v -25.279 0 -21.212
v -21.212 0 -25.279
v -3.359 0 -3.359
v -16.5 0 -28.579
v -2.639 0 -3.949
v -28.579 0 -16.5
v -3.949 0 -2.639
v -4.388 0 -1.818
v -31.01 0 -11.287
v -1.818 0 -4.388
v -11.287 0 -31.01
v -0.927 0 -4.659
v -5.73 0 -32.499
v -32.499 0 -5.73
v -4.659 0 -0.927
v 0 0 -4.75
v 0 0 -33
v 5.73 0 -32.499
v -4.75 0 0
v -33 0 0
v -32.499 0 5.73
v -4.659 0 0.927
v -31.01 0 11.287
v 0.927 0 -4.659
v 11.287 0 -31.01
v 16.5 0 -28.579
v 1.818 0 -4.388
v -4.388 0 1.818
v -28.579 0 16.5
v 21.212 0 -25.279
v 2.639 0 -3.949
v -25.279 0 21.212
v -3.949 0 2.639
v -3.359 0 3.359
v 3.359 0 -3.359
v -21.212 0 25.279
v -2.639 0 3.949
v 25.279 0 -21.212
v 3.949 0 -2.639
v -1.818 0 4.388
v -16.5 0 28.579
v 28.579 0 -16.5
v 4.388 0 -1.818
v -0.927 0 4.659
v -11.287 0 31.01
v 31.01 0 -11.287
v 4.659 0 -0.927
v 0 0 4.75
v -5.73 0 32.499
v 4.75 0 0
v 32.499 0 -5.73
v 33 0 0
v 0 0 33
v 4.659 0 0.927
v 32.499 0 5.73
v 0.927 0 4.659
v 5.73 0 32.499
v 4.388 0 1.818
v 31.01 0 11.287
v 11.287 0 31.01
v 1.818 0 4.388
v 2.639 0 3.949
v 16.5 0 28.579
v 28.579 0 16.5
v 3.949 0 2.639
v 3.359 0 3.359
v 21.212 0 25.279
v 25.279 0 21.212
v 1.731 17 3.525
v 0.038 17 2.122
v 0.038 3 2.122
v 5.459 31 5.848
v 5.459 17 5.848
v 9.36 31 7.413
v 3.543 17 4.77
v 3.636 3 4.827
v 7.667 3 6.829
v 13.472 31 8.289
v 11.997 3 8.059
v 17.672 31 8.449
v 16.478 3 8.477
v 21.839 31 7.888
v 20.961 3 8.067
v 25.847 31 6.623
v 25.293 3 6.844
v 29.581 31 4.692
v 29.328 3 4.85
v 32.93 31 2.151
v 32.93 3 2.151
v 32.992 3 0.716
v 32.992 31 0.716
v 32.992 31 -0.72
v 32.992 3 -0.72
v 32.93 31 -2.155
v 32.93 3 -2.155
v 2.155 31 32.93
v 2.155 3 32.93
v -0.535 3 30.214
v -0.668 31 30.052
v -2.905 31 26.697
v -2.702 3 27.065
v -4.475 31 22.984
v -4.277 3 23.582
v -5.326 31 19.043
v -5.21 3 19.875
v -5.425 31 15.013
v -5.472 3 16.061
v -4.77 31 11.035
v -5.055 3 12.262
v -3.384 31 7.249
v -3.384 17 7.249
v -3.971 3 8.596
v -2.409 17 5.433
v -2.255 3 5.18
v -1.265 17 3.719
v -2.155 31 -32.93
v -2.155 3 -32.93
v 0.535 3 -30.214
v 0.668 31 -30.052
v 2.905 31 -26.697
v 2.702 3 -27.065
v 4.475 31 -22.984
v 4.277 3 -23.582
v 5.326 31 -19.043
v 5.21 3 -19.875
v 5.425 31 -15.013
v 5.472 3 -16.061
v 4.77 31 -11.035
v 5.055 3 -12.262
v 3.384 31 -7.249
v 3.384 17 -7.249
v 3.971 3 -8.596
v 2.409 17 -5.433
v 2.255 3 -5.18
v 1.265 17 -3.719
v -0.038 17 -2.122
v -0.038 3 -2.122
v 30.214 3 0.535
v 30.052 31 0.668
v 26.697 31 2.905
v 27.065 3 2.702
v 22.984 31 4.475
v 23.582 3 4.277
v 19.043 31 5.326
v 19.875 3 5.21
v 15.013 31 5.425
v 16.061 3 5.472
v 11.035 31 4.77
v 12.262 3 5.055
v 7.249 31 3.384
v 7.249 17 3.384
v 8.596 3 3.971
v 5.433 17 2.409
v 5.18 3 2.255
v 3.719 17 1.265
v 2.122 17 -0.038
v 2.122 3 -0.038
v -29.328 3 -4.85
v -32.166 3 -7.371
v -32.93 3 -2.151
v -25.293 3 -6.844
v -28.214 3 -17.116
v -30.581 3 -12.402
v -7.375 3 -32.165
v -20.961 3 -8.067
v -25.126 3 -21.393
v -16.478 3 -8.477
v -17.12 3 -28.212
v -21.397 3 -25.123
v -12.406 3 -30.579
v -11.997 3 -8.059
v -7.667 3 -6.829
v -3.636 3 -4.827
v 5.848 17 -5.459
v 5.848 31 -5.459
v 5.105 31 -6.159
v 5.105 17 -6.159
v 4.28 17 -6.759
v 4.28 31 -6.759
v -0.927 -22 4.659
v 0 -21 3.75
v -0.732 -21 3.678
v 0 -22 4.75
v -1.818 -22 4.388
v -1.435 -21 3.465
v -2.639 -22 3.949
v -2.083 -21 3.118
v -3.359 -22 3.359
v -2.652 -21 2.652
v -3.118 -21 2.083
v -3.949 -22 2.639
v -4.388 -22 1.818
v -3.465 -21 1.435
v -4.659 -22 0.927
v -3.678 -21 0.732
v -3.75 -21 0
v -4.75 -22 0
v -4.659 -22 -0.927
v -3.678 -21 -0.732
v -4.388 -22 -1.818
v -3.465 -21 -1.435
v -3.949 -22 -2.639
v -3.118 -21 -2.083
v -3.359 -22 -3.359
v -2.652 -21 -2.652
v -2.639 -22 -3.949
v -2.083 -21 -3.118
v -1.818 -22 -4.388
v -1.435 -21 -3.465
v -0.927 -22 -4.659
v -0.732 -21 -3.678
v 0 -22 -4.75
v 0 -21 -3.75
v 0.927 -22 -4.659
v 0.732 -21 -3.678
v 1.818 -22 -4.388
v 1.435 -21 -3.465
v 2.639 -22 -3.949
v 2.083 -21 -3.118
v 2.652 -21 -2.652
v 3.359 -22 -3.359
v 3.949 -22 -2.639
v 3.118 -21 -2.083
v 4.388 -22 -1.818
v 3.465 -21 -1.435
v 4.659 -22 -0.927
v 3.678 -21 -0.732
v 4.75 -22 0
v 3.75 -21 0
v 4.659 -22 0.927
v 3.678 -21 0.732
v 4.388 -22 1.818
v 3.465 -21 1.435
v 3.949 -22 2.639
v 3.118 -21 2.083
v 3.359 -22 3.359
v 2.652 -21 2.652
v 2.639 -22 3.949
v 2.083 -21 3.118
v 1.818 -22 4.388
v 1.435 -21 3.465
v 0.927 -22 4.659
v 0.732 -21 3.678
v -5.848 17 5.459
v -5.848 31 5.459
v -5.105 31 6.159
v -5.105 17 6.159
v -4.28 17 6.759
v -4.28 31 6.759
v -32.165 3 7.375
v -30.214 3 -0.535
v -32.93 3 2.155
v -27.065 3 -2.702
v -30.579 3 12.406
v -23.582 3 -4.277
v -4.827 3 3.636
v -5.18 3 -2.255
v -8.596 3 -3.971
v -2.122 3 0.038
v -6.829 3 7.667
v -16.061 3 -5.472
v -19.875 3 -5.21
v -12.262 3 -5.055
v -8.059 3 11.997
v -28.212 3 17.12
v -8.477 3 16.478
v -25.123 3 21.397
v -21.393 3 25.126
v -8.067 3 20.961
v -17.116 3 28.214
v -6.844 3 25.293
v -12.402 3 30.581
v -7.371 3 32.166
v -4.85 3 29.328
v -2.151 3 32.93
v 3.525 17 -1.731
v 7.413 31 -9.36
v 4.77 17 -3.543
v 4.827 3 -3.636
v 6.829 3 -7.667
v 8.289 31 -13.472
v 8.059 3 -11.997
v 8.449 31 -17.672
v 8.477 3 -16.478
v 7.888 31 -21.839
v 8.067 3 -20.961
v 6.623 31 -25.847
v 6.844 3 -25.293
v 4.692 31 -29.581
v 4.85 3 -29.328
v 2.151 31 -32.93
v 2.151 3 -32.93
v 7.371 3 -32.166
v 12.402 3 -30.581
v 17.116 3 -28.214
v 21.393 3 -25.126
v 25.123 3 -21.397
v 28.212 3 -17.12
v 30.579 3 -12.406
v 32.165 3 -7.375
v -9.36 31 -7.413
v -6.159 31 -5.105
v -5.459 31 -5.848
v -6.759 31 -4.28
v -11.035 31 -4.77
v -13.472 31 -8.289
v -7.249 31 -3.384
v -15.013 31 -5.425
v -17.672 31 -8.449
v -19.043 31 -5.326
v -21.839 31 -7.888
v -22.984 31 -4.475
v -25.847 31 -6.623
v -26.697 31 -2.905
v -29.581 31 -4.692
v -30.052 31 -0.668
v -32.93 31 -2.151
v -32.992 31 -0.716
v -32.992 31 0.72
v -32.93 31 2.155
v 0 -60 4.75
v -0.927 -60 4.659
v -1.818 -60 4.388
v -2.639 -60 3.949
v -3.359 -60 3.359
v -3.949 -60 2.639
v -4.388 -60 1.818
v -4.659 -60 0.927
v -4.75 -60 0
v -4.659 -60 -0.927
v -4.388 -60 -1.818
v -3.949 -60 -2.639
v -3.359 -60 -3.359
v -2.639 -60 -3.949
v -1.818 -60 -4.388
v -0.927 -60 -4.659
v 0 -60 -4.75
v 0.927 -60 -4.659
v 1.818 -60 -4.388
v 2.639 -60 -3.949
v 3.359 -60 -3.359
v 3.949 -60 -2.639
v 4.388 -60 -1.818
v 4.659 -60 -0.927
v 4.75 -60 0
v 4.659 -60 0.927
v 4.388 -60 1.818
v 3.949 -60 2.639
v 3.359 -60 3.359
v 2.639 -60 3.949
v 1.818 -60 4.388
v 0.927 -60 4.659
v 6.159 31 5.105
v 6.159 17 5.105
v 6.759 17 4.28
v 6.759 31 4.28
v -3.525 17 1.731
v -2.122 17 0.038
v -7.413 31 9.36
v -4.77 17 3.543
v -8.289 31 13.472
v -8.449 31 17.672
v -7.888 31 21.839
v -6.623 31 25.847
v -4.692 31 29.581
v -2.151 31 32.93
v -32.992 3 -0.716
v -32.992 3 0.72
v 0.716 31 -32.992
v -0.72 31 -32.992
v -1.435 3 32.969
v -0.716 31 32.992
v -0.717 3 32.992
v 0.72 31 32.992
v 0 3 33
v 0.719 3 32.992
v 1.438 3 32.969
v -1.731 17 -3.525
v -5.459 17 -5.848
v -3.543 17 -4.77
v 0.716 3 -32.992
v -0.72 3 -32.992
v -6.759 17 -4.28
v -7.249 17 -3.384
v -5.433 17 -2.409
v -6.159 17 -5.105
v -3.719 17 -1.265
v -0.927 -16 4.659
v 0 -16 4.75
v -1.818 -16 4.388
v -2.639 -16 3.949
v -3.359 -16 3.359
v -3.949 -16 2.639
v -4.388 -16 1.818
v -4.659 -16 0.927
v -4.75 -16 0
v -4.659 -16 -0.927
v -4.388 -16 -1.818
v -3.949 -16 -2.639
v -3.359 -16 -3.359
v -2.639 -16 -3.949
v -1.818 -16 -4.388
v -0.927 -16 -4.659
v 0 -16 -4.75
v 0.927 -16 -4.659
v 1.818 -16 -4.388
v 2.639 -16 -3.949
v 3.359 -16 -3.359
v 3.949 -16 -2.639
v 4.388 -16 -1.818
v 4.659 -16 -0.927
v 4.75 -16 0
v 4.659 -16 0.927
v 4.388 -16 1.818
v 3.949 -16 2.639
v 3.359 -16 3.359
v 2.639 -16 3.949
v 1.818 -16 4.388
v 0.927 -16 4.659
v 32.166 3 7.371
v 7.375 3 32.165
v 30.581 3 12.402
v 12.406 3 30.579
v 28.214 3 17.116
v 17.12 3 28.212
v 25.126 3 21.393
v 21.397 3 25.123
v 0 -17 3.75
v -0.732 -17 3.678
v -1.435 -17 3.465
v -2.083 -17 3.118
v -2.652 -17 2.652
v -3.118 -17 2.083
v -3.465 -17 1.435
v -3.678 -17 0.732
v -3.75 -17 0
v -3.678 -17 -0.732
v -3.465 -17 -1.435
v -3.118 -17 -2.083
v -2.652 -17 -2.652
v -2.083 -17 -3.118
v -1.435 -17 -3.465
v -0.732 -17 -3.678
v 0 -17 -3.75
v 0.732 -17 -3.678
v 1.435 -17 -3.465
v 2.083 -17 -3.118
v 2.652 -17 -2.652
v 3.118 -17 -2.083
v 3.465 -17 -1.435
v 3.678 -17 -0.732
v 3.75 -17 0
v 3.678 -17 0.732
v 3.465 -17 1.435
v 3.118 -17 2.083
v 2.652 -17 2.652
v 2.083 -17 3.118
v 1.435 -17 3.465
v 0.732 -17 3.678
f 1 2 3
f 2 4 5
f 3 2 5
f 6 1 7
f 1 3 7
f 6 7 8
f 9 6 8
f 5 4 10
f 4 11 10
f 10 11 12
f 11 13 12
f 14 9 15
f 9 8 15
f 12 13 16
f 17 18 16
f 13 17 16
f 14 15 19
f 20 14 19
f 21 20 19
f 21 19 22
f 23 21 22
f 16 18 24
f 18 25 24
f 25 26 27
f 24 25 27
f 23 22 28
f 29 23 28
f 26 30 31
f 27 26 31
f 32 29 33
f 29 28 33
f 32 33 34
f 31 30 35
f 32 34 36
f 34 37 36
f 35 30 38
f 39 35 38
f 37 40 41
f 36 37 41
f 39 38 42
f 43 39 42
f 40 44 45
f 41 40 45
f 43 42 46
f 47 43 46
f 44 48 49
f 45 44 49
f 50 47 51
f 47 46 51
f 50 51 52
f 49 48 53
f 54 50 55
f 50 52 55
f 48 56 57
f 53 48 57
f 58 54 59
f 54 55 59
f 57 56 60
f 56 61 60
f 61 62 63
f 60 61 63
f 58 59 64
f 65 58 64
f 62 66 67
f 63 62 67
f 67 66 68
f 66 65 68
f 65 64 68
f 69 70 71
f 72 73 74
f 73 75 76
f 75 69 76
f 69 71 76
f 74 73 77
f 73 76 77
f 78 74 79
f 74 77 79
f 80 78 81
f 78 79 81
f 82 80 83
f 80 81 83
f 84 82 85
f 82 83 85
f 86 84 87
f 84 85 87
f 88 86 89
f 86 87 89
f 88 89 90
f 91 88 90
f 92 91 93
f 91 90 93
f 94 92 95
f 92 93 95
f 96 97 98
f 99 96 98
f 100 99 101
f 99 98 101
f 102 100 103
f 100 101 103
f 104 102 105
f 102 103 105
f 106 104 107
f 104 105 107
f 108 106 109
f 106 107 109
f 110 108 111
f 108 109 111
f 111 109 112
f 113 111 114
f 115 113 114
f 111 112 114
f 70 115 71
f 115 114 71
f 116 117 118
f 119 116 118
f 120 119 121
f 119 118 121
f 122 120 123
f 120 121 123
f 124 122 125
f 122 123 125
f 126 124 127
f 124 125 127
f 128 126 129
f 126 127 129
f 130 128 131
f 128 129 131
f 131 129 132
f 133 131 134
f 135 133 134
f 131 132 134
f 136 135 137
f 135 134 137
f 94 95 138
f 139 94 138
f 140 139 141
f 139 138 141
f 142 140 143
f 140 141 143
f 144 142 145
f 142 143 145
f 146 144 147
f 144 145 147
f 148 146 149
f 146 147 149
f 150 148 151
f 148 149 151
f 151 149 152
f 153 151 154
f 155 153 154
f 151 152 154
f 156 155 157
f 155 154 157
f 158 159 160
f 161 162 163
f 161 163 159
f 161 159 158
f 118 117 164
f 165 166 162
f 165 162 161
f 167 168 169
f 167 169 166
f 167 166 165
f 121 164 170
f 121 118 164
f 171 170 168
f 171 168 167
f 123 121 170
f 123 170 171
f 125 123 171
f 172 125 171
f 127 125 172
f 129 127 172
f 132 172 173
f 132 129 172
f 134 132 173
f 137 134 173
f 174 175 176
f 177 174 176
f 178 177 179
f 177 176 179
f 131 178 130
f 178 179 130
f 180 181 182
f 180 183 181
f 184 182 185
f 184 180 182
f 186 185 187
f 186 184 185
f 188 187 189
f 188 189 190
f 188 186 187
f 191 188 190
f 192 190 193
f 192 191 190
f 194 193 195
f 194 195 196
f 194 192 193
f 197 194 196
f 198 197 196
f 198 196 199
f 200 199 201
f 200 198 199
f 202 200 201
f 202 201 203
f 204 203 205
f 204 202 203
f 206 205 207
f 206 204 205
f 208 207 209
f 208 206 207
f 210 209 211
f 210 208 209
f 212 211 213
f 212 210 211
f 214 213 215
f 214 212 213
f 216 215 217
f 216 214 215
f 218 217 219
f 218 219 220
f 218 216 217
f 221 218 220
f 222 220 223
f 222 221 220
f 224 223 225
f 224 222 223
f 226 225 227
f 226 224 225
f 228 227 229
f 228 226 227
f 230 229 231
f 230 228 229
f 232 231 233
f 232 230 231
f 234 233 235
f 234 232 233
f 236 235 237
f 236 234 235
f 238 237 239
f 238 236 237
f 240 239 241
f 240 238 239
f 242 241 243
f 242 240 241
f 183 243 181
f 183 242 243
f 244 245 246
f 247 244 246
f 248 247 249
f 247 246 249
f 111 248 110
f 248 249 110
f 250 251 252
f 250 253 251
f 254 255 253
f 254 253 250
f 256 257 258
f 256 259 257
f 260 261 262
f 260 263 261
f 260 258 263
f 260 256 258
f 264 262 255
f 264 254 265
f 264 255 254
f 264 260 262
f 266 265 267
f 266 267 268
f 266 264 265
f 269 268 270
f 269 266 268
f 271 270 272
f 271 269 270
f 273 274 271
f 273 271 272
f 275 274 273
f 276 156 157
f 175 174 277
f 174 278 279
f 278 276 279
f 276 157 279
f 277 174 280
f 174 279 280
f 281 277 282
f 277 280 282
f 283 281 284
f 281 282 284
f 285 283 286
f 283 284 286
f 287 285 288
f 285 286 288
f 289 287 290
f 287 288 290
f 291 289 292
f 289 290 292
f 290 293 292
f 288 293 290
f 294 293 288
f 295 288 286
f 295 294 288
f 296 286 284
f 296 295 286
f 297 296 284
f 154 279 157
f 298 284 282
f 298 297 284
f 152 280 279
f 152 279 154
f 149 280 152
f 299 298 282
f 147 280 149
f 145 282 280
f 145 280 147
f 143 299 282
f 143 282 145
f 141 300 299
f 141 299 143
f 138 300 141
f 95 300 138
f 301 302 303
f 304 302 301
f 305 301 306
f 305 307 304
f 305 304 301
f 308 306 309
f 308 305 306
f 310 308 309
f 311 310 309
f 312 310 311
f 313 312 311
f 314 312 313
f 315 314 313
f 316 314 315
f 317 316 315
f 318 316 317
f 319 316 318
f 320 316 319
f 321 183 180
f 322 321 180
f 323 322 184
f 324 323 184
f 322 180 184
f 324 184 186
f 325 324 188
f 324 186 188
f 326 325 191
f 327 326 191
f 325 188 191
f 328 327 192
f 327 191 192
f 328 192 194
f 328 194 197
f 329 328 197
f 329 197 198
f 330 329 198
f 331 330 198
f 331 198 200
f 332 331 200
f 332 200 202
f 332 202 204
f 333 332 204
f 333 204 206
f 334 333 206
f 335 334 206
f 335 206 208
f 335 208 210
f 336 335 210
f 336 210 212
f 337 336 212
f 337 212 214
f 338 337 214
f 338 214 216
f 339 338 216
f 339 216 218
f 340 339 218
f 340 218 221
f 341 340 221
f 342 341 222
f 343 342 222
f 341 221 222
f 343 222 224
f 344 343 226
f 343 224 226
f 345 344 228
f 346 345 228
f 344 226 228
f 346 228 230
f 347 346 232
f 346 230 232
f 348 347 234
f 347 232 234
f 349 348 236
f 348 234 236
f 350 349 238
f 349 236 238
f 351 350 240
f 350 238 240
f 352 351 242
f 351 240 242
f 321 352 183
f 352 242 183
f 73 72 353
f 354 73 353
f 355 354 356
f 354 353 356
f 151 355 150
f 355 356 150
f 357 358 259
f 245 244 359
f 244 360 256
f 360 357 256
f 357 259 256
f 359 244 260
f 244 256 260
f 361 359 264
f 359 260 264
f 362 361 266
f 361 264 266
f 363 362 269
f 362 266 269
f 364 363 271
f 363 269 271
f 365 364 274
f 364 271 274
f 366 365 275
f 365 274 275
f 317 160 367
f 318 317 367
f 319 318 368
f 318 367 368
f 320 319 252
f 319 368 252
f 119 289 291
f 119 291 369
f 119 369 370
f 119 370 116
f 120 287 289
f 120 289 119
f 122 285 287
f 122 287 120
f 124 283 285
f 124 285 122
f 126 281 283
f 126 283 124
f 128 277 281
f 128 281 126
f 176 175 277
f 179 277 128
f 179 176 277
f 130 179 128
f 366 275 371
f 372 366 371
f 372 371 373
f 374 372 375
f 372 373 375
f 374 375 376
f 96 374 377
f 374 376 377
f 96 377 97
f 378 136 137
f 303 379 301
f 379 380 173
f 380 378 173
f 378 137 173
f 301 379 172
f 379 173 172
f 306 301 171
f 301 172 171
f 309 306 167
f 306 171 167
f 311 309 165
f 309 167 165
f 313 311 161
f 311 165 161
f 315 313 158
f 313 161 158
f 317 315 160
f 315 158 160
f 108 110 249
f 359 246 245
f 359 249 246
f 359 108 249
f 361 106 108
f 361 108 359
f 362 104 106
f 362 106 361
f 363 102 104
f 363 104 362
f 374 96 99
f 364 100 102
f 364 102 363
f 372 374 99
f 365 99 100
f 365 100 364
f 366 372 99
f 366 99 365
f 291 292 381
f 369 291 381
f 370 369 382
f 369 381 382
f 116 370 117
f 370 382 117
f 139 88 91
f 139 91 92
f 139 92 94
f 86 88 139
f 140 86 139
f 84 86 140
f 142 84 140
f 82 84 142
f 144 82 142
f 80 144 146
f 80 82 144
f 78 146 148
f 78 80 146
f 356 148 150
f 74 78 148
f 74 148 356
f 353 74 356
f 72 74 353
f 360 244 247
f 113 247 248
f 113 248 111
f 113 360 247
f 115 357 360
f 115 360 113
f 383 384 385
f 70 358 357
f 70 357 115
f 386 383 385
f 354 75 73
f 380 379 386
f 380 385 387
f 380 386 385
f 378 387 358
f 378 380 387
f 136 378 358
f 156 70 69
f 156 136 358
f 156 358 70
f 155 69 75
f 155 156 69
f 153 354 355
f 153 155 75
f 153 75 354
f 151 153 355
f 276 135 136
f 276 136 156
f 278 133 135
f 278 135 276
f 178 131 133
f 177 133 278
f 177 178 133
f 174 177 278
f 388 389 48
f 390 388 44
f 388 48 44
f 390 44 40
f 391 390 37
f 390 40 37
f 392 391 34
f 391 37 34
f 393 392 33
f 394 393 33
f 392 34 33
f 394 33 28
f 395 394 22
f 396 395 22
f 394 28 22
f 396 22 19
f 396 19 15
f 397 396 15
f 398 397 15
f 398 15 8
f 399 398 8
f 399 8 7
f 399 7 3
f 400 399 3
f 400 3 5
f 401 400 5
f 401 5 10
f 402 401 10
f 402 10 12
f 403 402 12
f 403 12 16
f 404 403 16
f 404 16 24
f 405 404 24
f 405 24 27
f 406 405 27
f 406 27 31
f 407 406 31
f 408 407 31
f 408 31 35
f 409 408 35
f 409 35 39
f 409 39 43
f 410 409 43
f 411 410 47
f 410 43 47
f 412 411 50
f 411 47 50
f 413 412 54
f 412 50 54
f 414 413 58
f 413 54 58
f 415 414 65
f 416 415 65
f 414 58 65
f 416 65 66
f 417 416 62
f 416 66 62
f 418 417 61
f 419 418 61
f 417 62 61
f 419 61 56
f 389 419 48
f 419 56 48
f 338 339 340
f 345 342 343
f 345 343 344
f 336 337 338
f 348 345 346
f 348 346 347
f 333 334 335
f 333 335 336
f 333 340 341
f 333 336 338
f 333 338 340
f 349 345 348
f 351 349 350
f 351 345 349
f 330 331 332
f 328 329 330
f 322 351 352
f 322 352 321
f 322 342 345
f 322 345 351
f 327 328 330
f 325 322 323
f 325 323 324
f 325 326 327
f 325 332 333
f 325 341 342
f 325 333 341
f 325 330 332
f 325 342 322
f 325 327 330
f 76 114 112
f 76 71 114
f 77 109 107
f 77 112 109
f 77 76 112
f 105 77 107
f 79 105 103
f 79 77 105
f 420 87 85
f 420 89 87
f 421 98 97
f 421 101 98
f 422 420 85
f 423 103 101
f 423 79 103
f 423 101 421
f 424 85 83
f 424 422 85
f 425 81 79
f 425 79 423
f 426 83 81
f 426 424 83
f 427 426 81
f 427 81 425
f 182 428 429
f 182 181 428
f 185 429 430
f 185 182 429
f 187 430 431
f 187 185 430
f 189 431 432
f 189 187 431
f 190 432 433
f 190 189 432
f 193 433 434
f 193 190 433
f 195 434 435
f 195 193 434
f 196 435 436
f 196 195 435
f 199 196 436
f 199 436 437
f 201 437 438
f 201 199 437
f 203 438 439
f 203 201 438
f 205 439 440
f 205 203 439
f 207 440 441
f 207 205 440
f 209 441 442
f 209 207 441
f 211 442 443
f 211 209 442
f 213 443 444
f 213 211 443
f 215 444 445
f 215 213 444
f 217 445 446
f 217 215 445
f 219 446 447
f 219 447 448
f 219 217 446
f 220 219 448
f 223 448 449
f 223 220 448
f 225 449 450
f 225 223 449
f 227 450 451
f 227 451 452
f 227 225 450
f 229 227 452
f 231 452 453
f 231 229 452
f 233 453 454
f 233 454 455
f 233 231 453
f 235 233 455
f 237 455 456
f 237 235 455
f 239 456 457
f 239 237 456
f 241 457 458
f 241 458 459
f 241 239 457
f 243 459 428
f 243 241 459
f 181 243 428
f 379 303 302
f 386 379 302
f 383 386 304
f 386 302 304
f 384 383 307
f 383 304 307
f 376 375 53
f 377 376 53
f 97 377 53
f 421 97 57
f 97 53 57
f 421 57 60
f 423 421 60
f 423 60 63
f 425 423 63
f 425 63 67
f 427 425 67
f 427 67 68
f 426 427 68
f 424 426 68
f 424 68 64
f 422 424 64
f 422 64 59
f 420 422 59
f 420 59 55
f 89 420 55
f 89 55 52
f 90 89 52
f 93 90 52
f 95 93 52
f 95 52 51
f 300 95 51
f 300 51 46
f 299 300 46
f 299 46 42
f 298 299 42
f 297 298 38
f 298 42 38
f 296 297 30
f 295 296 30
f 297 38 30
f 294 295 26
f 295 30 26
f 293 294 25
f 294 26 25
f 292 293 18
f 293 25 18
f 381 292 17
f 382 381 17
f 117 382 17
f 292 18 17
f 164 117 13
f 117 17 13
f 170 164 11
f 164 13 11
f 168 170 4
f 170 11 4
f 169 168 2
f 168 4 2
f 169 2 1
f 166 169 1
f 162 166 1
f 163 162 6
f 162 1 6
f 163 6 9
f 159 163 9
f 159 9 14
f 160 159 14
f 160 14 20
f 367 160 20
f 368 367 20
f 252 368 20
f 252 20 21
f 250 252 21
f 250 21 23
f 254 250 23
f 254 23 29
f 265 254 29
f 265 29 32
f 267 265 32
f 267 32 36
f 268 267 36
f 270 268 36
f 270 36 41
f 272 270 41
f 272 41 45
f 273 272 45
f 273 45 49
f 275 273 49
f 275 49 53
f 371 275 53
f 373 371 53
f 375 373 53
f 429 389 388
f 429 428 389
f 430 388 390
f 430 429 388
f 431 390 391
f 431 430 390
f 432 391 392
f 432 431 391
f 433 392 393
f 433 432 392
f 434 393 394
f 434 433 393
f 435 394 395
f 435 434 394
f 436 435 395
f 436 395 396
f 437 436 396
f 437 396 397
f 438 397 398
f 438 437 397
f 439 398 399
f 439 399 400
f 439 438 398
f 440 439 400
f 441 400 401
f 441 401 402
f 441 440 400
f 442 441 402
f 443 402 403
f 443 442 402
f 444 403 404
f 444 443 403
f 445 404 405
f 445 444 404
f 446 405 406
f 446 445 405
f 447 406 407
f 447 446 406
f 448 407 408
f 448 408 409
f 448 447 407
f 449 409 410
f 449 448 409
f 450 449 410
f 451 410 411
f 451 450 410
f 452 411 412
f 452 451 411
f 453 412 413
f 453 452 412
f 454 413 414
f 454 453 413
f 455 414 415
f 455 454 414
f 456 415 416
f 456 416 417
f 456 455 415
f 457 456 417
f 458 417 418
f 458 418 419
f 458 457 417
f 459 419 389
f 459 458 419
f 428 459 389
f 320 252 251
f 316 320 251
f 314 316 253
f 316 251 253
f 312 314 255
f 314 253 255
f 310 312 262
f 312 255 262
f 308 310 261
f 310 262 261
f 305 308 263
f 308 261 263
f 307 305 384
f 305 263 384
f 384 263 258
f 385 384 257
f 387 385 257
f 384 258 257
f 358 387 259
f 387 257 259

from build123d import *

# Parameters (mm, degrees)
SKETCH1_R           = 33
BOSS_EXTRUDE1_DEPTH = 3
BOSS_EXTRUDE3_DEPTH = 28
CIRPATTERN2_COUNT   = 4
SKETCH4_R           = 8
CUT_EXTRUDE1_DEPTH  = 14
SKETCH5_R           = 4.75
BOSS_EXTRUDE4_DEPTH = 60


with BuildPart() as part:
    # Sketch1 → Boss-Extrude1 (new body)
    with BuildSketch(Plane(origin=(0, 0, 0), x_dir=(1, 0, 0), z_dir=(0, 1, 0))):
        with Locations(Location((0, 0, 0), (0, 0, 270))):
            Circle(SKETCH1_R)
    extrude(amount=BOSS_EXTRUDE1_DEPTH)

    # Sketch3 → Boss-Extrude3 (add)
    with BuildSketch(Plane(origin=(0, 3, 0), x_dir=(1, 0, 0), z_dir=(0, 1, 0))):
        with BuildLine():
            Line((1.076086957, 1.045005676), (-1.076086957, -1.045005676))
            ThreePointArc((-1.076086957, -1.045005676), (15.703563953, -8.46363111), (32.929819694, -2.151040426))
            ThreePointArc((32.929819694, -2.151040426), (32.999999926, 0.002211213), (32.929531131, 2.155453428))
            ThreePointArc((32.929531131, 2.155453428), (17.249059735, -5.463527063), (1.076086957, 1.045005676))
        make_face()
    boss_extrude3 = extrude(amount=BOSS_EXTRUDE3_DEPTH)

    # CirPattern2: Boss-Extrude3 ×4 about axis
    cirpattern2_axis = Axis((0, 0, 0), (0, 1, 0))
    for i in range(1, CIRPATTERN2_COUNT):
        add(boss_extrude3.rotate(cirpattern2_axis, i * 360 / CIRPATTERN2_COUNT))

    # Sketch4 → Cut-Extrude1 (cut)
    with BuildSketch(Plane(origin=(0, 31, 0), x_dir=(1, 0, 0), z_dir=(0, 1, 0))):
        Circle(SKETCH4_R)
    extrude(amount=-CUT_EXTRUDE1_DEPTH, mode=Mode.SUBTRACT)

    # Sketch5 → Boss-Extrude4 (add)
    with BuildSketch(Plane.XZ):
        with Locations(Location((0, 0, 0), (0, 0, 90))):
            Circle(SKETCH5_R)
    extrude(amount=BOSS_EXTRUDE4_DEPTH)

    # Sketch6 → Cut-Revolve1 (revolve, cut)
    with BuildSketch(Plane.XY, mode=Mode.PRIVATE) as cut_revolve1_sk:
        Polygon((-4.75, -16), (-3.75, -17), (-3.75, -21), (-4.75, -22), align=None)
    revolve(cut_revolve1_sk.sketch.rotate(Axis((0, 0, 0), (0, -1, 0)), 270), axis=Axis((0, 0, 0), (0, -1, 0)), mode=Mode.SUBTRACT)


solid = part.part
